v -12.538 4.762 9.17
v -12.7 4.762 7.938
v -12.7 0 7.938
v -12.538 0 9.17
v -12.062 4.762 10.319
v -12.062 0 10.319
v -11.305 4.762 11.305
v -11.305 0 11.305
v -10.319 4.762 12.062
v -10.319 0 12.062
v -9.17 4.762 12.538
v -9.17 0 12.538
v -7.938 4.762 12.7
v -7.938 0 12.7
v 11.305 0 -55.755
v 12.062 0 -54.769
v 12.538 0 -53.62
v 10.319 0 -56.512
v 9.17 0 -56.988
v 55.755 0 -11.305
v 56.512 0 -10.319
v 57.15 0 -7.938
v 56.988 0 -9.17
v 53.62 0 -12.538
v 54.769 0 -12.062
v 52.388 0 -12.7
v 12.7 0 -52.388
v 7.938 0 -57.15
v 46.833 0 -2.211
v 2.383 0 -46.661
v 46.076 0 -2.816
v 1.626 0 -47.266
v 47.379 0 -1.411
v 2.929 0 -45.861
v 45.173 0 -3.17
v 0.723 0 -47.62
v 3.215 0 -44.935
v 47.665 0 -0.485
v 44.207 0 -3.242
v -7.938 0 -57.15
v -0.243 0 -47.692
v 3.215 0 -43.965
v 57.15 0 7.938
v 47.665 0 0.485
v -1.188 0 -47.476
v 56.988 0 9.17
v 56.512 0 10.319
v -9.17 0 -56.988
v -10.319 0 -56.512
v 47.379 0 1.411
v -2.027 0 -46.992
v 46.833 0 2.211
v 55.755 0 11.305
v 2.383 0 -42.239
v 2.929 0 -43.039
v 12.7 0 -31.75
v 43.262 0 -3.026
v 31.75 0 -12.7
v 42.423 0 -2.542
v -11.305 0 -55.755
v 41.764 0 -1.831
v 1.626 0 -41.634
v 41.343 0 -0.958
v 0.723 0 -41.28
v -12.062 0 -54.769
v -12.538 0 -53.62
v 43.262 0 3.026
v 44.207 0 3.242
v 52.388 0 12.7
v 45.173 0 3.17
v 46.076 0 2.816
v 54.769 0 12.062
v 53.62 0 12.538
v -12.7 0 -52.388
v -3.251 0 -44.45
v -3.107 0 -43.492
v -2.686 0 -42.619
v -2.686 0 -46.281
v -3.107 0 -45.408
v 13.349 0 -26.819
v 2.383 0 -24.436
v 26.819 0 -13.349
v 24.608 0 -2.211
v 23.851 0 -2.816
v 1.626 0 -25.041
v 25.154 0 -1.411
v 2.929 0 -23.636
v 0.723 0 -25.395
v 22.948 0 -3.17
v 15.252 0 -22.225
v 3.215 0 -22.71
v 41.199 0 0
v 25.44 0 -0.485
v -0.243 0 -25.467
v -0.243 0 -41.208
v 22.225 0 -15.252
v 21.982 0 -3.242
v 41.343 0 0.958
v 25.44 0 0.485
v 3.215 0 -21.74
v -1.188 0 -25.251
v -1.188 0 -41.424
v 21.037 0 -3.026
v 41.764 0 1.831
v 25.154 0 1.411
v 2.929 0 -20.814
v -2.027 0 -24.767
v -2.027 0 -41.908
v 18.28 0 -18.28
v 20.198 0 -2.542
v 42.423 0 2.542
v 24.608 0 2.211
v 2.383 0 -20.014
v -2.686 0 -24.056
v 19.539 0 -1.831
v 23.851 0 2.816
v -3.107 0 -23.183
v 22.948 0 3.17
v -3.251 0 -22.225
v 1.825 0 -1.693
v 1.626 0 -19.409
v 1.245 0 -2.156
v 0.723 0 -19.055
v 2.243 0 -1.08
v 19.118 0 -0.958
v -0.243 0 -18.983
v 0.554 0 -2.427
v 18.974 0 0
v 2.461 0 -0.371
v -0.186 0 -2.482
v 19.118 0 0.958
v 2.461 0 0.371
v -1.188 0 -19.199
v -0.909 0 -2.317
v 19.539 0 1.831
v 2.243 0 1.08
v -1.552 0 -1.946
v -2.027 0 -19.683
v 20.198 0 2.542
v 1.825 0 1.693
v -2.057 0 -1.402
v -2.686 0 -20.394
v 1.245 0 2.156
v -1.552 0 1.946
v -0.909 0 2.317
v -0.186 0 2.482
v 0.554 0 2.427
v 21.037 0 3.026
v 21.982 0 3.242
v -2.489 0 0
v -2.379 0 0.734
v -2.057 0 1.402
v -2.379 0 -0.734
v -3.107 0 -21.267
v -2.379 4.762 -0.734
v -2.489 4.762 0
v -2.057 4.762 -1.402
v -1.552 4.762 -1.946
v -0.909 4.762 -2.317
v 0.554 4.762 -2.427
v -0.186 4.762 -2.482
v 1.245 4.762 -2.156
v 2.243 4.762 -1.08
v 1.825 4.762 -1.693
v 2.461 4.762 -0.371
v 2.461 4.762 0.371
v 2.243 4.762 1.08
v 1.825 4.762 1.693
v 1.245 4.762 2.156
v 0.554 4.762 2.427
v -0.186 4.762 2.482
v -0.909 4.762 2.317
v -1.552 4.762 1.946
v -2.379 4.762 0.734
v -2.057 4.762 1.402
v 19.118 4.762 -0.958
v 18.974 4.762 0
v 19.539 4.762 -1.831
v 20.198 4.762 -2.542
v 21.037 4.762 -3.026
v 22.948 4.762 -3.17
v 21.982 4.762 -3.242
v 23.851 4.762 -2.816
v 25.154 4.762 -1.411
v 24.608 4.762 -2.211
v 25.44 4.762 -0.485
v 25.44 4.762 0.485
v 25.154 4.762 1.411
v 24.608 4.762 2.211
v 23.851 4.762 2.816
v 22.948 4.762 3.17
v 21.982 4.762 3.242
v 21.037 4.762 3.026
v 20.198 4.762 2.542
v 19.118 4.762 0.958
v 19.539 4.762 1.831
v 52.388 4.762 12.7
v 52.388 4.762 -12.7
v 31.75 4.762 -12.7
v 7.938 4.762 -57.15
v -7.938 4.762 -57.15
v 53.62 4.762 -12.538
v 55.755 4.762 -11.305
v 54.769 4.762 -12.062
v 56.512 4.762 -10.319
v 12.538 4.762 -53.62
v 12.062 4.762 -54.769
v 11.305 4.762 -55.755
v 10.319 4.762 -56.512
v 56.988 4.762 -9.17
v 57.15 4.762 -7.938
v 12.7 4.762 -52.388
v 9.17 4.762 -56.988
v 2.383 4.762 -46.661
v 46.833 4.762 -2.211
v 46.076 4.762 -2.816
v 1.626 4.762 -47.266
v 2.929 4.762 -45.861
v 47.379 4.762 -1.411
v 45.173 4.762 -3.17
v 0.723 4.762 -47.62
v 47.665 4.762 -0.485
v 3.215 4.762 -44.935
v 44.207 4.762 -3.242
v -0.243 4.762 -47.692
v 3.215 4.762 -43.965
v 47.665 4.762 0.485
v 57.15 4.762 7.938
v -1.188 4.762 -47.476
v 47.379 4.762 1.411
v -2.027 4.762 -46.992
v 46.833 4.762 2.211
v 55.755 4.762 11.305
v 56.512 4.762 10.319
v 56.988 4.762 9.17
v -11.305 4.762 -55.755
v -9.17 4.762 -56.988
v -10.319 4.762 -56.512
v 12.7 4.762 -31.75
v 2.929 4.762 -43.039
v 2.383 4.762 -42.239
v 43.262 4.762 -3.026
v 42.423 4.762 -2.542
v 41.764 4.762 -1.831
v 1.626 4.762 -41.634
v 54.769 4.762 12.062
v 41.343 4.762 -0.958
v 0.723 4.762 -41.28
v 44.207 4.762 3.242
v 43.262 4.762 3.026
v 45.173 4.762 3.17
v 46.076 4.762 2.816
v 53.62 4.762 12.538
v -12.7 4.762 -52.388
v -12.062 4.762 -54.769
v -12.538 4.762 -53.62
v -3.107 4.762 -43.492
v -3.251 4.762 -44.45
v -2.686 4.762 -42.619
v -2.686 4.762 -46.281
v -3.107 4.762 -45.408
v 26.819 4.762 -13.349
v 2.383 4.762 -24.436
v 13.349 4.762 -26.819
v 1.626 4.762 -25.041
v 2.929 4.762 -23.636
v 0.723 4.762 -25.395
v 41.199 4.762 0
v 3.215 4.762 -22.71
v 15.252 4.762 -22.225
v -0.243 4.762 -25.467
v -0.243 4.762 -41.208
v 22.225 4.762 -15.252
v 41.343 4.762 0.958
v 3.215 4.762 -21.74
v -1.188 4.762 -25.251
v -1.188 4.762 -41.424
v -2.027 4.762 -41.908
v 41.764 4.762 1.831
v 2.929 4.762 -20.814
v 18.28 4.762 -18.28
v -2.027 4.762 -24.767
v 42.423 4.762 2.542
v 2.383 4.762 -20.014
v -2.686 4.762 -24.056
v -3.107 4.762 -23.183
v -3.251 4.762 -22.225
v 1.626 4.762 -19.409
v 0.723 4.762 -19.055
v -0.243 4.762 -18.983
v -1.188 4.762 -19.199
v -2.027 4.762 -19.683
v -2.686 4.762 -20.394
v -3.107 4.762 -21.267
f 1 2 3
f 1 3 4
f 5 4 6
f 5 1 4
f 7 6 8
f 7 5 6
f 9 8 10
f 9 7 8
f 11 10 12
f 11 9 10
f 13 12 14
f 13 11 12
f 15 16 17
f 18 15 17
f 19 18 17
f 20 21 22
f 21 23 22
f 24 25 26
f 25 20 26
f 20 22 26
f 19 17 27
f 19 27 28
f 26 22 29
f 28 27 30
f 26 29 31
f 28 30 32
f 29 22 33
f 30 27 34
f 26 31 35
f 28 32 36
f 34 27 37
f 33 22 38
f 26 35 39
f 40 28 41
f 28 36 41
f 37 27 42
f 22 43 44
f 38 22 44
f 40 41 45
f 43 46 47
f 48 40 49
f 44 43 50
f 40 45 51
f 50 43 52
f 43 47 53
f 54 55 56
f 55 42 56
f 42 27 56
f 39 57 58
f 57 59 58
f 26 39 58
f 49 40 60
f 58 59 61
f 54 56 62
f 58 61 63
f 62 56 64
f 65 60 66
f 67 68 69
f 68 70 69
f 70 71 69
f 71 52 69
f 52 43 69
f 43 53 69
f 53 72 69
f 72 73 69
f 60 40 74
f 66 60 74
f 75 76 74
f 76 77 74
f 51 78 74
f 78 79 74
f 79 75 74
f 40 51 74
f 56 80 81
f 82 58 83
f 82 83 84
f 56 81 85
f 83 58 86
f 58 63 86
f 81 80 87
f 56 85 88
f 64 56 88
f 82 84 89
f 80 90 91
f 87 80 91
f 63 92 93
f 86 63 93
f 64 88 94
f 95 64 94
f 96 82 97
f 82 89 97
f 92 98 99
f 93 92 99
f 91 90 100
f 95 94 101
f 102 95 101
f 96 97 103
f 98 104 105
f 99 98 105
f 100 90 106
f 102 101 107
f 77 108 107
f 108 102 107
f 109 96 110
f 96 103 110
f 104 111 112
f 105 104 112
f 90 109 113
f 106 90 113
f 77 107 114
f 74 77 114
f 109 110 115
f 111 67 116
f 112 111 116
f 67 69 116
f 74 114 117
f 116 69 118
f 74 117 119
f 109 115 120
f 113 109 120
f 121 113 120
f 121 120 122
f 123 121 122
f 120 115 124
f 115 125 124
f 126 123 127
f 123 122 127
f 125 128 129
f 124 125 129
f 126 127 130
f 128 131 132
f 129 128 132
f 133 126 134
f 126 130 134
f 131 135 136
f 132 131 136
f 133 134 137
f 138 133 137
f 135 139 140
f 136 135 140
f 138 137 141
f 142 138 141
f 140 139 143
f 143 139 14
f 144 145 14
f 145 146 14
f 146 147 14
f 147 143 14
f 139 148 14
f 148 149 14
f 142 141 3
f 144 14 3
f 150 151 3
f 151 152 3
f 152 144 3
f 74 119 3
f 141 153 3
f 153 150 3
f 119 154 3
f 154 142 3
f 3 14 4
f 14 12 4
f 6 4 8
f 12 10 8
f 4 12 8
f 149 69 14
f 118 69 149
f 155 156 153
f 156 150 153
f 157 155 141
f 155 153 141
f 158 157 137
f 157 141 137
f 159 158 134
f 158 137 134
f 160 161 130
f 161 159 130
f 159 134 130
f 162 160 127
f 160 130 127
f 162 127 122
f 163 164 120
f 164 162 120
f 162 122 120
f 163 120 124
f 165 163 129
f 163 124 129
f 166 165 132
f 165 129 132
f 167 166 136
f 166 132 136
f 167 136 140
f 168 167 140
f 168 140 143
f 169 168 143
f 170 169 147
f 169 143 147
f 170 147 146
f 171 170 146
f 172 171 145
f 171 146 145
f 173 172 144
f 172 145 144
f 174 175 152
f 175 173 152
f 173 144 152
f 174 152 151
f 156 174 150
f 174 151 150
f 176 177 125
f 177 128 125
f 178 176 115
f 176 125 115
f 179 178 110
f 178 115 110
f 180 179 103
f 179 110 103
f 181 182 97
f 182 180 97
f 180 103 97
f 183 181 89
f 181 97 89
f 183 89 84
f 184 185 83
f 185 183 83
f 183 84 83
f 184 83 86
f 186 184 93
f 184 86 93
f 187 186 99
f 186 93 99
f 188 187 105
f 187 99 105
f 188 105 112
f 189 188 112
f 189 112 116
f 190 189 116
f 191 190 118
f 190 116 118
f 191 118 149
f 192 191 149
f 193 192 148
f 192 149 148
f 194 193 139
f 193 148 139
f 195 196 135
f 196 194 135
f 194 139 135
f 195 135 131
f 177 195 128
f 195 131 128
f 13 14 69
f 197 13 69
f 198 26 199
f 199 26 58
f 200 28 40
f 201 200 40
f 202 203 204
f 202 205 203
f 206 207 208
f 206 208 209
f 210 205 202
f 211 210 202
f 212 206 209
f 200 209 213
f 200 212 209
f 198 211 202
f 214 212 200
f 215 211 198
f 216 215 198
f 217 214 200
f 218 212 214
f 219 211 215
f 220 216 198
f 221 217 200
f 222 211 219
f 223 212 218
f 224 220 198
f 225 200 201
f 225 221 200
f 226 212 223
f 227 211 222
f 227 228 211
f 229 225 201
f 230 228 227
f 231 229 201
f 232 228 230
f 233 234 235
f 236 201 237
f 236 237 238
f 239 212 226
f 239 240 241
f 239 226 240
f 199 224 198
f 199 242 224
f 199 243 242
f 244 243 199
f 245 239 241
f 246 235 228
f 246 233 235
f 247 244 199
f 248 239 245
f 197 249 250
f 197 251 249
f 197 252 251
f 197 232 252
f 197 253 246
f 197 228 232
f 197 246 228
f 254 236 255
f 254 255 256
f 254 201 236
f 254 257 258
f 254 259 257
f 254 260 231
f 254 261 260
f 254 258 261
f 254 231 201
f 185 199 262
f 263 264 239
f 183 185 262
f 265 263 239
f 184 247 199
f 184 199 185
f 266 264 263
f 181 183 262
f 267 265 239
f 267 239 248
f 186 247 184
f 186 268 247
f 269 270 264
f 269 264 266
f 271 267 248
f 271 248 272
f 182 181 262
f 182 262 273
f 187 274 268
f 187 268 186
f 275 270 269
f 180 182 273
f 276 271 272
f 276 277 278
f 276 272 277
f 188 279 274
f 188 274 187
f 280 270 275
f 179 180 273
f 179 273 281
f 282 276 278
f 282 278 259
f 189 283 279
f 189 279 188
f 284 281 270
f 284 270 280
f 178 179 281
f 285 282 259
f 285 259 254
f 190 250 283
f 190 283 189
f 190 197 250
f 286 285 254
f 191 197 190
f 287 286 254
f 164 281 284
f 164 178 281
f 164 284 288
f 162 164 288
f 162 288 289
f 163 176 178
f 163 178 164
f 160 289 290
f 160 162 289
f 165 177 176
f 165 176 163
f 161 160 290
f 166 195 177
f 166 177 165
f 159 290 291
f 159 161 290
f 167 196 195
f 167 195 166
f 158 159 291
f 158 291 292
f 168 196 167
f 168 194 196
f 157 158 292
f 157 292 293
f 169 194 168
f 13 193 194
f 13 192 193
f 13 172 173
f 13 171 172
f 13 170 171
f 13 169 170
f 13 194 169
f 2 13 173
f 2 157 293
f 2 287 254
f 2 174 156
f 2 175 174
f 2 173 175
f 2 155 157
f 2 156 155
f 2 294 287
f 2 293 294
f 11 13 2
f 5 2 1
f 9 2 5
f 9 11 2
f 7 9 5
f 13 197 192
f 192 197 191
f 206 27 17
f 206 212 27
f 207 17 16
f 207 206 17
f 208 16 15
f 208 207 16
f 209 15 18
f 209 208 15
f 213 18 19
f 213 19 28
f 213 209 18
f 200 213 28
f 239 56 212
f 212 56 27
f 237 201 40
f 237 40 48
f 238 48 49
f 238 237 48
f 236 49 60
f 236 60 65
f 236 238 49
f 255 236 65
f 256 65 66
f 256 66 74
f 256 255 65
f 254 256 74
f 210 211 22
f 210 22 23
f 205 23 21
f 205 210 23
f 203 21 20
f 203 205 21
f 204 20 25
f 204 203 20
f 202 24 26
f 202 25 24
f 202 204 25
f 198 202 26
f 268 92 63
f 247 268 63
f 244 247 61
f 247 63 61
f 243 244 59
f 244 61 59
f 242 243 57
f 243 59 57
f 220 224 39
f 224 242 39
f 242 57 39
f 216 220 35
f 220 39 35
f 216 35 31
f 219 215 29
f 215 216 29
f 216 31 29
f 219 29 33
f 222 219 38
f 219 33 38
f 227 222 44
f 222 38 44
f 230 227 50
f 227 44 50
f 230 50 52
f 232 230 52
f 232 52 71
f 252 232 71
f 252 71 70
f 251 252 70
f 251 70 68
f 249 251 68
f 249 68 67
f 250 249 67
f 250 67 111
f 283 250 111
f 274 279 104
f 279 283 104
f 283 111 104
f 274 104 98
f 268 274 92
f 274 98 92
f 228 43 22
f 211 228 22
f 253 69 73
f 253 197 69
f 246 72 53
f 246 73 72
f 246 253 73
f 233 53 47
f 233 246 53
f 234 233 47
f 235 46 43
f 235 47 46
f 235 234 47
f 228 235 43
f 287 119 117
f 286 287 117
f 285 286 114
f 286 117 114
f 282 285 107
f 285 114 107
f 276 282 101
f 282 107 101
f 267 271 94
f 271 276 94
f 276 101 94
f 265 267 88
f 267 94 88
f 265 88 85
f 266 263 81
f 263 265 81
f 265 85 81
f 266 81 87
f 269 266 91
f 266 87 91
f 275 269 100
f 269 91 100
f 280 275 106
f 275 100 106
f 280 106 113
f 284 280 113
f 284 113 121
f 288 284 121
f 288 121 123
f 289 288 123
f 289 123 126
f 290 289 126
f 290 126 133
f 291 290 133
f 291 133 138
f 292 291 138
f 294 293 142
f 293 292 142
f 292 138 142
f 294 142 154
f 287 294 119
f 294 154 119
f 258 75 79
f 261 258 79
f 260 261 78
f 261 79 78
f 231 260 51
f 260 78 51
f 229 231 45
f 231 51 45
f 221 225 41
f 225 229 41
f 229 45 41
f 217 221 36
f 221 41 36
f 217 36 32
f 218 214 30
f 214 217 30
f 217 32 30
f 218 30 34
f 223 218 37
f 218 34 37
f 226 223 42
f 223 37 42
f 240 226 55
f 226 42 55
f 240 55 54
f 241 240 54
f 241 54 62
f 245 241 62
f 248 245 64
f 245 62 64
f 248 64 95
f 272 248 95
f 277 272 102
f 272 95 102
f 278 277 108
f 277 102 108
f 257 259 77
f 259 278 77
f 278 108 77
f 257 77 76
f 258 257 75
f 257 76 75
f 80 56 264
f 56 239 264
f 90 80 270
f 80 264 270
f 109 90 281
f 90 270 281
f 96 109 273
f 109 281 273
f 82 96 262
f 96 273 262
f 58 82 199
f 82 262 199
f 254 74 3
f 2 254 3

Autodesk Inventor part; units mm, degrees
ref_plane "YZ Plane" through (0, 0, 0) normal (1, 0, 0) x (0, 1, 0)
ref_plane "XZ Plane" through (0, 0, 0) normal (0, 1, 0) x (-1, 0, 0)
ref_plane "XY Plane" through (0, 0, 0) normal (0, 0, 1) x (1, 0, 0)
sketch "Sketch1" plane through (0, 0, 0) normal (0, 1, 0) x (-1, 0, 0)
  circle A0 centre (0, 0) radius 2.4892
  circle A1 centre (0, -22.225) radius 3.2512
  circle A2 centre (0, -44.45) radius 3.2512
  circle A3 centre (-22.225, 0) radius 3.2512
  circle A4 centre (-44.45, 0) radius 3.2512
  line L0 (12.7, 12.7) -> (-57.15, 12.7)
  line L1 (-57.15, 12.7) -> (-57.15, -12.7)
  line L2 (-57.15, -12.7) -> (-12.7, -12.7)
  line L3 (-12.7, -12.7) -> (-12.7, -57.15)
  line L4 (-12.7, -57.15) -> (12.7, -57.15)
  line L5 (12.7, -57.15) -> (12.7, 12.7)
  dimension "d0" = 4.9784
  dimension "d1" = 6.5024
  dimension "d2" = 22.225
  dimension "d3" = 22.225
  dimension "d4" = 22.225
  dimension "d5" = 22.225
  dimension "d6" = 12.7
  dimension "d7" = 12.7
  dimension "d8" = 12.7
  dimension "d9" = 12.7
  dimension "d10" = 12.7
  dimension "d11" = 12.7
extrude "Extrusion1" add sketch "Sketch1" along normal blind 4.7625
fillet "Fillet1" radius 19.05 1 edges at (12.7, 2.3813, -12.7)
fillet "Fillet2" radius 4.7625 5 edges at (57.15, 2.3813, -12.7) (57.15, 2.3813, 12.7) (12.7, 2.3813, -57.15) (-12.7, 2.3813, -57.15) (-12.7, 2.3813, 12.7)
properties part number "STRU_016_FrameBracket2_90" material "Aluminum 6061"
